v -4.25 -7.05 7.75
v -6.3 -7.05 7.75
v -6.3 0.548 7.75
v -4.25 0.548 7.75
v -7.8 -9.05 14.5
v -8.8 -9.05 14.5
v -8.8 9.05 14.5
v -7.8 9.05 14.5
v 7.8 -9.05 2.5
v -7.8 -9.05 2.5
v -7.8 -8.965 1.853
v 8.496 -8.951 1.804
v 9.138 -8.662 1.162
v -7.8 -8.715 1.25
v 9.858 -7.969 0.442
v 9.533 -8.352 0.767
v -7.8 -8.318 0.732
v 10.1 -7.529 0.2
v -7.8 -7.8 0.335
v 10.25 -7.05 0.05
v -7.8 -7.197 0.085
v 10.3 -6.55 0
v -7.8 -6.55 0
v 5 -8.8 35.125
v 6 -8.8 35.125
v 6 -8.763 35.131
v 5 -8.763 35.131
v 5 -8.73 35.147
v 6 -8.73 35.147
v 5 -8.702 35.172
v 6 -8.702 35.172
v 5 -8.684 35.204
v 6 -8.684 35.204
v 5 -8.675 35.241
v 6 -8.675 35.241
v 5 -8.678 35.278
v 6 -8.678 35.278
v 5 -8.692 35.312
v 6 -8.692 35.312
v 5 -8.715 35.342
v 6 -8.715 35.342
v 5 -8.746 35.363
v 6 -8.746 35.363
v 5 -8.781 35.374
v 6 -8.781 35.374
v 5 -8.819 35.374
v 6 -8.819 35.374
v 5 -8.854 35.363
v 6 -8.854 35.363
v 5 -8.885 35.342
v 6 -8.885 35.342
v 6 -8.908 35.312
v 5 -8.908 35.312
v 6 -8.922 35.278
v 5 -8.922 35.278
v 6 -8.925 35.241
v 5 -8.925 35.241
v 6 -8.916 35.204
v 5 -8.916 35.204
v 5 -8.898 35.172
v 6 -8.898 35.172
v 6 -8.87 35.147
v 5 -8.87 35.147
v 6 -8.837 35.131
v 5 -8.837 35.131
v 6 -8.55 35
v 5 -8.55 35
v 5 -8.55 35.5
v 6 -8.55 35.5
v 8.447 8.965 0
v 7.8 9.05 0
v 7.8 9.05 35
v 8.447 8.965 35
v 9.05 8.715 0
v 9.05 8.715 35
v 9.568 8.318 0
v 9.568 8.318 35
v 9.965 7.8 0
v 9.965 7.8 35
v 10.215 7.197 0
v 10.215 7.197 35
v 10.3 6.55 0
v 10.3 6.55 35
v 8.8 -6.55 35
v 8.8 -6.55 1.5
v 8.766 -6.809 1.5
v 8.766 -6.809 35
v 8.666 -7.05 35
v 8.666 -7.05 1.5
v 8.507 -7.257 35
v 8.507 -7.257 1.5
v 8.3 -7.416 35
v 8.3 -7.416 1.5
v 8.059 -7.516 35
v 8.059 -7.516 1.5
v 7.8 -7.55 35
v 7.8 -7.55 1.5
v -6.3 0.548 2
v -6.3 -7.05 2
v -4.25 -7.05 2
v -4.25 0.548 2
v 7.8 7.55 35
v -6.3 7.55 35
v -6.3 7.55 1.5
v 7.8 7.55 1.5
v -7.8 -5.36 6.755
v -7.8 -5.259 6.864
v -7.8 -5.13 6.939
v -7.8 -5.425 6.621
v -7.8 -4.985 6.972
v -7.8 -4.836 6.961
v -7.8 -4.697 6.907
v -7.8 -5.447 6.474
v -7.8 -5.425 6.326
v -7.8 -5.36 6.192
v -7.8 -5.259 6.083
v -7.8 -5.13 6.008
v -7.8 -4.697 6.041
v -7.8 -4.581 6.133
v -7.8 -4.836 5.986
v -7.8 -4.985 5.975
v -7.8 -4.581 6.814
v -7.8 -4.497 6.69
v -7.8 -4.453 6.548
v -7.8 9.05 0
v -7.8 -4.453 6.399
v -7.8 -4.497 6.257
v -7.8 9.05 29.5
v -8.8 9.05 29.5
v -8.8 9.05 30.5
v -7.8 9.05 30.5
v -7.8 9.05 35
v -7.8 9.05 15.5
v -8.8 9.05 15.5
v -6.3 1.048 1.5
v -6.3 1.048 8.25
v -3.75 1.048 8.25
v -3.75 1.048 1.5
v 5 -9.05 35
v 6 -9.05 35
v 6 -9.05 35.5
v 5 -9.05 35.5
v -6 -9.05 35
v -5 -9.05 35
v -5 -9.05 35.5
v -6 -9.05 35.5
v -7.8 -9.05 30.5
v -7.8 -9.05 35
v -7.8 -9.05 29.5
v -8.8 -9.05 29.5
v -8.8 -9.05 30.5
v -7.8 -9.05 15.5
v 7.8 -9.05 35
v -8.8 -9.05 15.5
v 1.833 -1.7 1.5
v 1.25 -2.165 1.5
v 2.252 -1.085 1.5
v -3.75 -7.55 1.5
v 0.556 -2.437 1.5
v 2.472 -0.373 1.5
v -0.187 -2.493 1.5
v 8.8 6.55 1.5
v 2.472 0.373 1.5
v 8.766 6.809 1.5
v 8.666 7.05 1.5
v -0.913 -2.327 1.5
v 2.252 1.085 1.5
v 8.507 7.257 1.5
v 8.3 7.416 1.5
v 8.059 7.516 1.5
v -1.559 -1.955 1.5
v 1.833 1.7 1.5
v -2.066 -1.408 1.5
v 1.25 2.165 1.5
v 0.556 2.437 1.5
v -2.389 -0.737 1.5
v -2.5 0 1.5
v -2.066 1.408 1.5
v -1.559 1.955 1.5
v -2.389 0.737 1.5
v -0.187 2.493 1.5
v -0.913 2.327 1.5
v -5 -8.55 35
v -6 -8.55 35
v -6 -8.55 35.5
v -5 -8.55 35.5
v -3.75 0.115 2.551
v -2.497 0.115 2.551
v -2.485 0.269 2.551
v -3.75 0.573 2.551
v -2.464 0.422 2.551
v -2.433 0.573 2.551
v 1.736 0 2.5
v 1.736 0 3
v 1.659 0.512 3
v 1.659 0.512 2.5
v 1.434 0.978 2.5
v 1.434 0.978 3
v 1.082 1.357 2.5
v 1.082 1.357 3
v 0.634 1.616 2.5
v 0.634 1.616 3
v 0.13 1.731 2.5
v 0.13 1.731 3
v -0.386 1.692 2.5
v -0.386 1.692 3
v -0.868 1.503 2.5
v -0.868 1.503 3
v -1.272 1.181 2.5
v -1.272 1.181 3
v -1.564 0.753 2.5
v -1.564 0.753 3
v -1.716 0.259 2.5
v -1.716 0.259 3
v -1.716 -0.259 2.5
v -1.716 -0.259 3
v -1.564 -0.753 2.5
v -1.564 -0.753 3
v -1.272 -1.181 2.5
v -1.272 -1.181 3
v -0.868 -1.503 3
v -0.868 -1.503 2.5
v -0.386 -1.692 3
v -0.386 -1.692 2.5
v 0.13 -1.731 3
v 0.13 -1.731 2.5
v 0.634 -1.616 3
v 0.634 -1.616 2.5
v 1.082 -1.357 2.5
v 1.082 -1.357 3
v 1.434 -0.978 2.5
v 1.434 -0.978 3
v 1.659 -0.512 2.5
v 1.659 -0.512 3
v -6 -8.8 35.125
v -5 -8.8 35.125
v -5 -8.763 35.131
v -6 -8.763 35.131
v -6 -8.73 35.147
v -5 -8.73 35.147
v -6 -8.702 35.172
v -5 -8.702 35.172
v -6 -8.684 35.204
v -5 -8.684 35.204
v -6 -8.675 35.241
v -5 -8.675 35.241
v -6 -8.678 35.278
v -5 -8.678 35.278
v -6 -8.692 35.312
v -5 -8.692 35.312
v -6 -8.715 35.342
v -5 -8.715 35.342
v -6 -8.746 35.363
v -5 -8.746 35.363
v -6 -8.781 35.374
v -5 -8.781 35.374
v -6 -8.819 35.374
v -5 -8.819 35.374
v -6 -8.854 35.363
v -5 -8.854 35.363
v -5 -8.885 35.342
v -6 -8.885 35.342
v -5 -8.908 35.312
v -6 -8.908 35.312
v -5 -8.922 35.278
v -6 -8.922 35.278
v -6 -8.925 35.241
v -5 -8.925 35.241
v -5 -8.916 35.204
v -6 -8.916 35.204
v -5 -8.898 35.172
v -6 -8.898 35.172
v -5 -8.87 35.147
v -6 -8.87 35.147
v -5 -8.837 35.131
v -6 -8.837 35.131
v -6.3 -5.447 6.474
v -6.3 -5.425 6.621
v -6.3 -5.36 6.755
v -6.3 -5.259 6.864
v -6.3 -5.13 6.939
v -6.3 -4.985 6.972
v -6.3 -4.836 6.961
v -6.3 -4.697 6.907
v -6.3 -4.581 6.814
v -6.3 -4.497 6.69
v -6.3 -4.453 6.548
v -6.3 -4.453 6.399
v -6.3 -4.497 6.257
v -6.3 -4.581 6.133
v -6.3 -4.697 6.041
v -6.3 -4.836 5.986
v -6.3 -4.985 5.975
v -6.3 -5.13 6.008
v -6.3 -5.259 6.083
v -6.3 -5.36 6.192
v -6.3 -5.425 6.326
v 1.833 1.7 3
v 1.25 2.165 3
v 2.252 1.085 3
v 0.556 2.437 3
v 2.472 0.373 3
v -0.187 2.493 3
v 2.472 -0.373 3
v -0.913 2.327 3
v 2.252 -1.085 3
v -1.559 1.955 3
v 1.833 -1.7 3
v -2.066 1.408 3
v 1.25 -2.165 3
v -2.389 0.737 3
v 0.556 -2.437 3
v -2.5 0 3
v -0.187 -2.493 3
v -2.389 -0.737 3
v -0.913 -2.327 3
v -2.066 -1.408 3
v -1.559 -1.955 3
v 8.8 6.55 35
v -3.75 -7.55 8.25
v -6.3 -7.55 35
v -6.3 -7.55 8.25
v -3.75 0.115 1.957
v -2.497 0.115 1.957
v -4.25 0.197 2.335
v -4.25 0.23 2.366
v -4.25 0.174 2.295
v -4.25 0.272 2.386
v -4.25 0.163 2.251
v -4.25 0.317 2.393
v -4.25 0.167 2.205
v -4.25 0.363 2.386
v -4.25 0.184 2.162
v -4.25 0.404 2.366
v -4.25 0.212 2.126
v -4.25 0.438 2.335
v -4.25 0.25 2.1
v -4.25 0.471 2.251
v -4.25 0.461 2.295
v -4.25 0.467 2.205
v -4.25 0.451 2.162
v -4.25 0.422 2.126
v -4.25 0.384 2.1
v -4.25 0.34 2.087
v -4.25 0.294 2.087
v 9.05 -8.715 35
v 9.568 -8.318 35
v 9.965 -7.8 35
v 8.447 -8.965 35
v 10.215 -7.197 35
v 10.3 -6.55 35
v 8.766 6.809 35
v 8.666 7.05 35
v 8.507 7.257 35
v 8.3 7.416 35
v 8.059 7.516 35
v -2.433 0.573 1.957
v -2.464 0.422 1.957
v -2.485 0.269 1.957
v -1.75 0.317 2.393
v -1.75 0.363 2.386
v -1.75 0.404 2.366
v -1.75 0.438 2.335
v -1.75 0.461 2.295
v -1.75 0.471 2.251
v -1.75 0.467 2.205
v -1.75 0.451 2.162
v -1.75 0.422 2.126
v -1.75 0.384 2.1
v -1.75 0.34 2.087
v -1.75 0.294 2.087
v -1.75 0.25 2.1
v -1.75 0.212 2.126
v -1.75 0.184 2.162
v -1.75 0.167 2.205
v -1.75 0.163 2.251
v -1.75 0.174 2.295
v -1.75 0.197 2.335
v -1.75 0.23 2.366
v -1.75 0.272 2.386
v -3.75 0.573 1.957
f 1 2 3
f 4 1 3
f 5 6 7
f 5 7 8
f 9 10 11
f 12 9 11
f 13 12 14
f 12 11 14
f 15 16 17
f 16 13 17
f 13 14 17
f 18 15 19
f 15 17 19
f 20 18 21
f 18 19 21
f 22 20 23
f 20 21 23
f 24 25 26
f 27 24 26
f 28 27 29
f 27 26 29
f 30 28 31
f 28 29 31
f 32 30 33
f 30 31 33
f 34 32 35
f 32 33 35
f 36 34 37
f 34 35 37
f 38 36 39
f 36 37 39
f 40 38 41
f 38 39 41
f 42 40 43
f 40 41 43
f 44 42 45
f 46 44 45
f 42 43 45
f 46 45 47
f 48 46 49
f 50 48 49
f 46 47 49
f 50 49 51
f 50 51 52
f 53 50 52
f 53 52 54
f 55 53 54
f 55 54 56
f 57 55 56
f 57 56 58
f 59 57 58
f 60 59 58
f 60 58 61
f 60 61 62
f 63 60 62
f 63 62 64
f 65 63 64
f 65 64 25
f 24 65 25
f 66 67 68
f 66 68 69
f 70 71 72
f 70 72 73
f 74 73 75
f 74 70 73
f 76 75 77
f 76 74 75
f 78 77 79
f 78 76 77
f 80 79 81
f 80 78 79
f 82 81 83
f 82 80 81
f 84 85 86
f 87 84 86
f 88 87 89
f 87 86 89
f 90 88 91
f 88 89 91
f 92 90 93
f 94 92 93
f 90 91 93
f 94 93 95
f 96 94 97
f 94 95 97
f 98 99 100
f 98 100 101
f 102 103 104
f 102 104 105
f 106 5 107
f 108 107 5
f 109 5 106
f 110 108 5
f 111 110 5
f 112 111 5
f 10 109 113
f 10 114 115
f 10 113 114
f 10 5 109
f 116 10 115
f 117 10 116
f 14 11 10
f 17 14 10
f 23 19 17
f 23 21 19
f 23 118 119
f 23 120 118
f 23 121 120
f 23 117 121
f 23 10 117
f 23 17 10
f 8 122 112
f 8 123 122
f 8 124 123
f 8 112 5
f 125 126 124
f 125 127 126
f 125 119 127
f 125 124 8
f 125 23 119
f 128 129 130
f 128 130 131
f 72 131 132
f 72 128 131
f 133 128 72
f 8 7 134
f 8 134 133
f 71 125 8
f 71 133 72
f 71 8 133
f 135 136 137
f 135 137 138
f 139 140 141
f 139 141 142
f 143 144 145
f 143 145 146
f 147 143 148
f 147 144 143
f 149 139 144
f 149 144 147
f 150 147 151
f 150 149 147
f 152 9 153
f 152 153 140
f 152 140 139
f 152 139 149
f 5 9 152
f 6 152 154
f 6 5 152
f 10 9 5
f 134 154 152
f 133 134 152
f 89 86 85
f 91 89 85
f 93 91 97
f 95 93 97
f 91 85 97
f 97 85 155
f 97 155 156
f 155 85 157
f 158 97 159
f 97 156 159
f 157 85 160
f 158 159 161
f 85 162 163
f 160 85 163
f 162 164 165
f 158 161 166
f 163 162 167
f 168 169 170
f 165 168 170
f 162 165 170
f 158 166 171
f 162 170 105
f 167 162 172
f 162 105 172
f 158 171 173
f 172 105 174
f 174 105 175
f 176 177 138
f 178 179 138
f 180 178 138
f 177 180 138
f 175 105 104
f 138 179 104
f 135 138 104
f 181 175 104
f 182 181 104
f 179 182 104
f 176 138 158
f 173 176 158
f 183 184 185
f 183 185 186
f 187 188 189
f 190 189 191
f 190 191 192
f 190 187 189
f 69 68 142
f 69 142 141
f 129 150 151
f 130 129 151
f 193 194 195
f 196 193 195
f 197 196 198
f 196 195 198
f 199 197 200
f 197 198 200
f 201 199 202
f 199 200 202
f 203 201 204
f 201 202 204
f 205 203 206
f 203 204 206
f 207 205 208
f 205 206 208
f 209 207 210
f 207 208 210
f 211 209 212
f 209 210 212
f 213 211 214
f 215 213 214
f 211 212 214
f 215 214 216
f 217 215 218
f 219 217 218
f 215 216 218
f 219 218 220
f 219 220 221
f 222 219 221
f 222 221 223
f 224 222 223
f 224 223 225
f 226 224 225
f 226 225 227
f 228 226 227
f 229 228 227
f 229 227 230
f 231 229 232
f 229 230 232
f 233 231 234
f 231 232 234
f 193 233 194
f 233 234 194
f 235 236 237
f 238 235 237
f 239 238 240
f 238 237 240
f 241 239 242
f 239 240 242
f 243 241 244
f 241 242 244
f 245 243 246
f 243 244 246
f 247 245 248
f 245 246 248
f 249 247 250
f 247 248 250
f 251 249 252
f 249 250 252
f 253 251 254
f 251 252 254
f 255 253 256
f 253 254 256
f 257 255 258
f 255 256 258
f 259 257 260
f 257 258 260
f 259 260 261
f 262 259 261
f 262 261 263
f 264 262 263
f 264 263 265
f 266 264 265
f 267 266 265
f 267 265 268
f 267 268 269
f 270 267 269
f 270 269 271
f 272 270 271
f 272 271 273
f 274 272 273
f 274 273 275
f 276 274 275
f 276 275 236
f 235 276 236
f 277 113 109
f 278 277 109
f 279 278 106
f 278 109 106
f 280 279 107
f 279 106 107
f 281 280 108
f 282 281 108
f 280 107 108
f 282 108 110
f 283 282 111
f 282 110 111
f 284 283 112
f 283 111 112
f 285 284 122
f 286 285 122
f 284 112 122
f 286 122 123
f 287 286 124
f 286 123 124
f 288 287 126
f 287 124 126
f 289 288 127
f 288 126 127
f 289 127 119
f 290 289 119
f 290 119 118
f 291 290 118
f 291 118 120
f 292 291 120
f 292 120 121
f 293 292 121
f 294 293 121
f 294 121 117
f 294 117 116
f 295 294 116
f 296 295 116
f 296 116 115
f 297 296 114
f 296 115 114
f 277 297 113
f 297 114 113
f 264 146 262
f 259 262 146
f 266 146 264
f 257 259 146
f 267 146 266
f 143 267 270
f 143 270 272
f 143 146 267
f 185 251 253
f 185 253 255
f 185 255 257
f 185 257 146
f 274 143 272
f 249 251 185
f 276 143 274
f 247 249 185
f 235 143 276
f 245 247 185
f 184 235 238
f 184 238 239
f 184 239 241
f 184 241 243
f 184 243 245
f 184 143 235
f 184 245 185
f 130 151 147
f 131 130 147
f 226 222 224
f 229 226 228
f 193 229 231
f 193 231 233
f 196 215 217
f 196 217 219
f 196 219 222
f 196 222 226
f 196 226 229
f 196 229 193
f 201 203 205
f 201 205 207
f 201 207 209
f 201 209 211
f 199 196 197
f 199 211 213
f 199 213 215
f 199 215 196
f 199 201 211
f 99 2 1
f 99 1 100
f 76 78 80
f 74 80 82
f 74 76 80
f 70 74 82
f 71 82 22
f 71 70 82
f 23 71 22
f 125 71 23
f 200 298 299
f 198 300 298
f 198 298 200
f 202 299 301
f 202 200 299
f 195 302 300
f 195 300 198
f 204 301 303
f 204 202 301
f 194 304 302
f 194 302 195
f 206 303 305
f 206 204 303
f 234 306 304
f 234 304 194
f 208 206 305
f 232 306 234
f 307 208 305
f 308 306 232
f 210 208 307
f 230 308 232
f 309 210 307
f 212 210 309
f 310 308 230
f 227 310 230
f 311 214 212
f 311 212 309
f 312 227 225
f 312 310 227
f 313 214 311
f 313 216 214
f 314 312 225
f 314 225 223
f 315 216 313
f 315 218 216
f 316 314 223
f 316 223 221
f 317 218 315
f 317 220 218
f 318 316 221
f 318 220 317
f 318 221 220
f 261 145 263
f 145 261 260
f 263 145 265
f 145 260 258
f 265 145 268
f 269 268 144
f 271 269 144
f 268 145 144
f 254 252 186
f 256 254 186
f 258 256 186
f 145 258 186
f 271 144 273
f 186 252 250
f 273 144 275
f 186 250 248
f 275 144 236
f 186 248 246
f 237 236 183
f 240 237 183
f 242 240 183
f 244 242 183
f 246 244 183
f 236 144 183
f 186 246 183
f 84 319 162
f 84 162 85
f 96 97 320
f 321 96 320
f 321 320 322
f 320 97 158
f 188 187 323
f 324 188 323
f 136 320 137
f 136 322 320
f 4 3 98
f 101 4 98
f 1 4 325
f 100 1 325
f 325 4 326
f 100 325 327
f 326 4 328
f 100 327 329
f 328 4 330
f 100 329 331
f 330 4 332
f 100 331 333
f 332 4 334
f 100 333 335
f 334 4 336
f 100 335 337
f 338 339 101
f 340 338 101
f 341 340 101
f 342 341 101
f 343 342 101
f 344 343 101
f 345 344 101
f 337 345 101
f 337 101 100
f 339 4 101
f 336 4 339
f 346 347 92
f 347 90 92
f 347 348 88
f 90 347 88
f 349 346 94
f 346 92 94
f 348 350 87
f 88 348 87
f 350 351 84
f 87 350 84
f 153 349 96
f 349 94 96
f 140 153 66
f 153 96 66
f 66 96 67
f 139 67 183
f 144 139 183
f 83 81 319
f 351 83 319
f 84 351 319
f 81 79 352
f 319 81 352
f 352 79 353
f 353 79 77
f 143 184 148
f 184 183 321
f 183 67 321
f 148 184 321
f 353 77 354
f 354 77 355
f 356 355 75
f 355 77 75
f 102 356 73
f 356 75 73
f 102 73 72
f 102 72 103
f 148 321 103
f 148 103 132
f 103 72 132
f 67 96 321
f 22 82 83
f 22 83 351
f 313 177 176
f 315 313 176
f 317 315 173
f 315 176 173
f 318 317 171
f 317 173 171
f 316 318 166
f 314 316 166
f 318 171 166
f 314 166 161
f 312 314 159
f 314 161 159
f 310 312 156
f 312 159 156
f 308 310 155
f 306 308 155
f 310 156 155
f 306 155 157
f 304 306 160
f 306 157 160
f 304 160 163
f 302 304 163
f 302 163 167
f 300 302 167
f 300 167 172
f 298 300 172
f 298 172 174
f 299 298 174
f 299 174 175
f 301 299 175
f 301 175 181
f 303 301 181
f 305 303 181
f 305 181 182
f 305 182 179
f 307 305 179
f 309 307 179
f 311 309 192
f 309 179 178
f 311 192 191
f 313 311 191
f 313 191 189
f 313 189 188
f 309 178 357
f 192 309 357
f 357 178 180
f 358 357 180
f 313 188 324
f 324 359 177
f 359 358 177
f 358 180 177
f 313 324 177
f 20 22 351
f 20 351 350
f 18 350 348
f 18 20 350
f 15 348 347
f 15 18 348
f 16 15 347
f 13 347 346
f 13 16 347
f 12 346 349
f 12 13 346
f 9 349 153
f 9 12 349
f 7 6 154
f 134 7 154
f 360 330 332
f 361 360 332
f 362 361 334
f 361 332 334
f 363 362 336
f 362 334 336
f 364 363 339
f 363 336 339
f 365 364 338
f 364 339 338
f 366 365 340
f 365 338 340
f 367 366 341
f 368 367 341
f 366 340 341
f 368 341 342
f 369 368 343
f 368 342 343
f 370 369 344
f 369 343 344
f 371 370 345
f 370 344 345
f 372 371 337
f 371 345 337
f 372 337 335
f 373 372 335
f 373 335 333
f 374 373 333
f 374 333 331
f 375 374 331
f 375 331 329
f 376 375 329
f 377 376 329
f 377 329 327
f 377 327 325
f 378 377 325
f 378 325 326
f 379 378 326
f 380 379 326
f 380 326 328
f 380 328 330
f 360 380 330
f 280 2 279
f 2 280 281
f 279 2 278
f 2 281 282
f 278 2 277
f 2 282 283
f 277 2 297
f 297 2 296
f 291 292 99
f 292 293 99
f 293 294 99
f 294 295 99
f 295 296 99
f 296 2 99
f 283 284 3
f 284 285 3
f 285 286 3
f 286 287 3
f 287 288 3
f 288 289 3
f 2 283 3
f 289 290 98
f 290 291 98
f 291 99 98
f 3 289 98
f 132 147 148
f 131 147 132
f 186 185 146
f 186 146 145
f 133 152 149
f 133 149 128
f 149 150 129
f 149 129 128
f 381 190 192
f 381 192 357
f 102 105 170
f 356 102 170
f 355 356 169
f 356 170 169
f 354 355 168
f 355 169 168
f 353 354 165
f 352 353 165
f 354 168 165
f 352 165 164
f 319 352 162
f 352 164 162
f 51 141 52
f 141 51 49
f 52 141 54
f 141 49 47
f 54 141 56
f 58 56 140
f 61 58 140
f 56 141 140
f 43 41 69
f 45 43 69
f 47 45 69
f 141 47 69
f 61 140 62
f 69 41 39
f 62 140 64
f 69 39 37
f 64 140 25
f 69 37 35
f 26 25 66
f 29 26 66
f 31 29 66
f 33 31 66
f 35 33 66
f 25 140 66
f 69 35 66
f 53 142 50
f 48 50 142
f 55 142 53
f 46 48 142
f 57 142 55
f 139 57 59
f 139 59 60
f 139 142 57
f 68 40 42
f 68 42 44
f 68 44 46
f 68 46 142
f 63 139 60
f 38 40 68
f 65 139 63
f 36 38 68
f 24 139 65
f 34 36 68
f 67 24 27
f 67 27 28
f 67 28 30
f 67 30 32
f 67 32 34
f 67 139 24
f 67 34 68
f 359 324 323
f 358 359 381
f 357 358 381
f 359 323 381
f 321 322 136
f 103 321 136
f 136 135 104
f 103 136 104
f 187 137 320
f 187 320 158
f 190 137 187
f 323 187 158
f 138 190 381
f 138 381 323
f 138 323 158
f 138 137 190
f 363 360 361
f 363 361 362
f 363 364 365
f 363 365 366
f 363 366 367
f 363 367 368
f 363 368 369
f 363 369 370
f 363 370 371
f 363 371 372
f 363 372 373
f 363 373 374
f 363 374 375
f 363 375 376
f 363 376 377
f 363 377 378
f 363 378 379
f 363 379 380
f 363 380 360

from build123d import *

# Parameters (mm, degrees)
BOSS_EXTRUDE1_DEPTH       = 35
BOSS_EXTRUDE3_DEPTH       = 1.5
SKETCH5_W                 = 1
SKETCH5_H                 = 1
BOSS_EXTRUDE4_DEPTH       = 18.1
CUT_EXTRUDE2_DEPTH        = 18.1
SKETCH9_W                 = 1
SKETCH9_H                 = 0.5
BOSS_EXTRUDE5_DEPTH       = 0.5
CUT_EXTRUDE3_REACH        = 41.512
SKETCH10_R                = 0.125
SKETCH11_R                = 2.5
BOSS_EXTRUDE6_DEPTH       = 1.5
SKETCH23_R                = 0.5
CUT_EXTRUDE12_DEPTH       = 1.5
SKETCH26_W                = 6.749879612
SKETCH26_H                = 8.598416767
SKETCH26_W_2              = 5.749879612
SKETCH26_H_2              = 7.598416767
BOSS_EXTRUDE16_DEPTH      = 2.05
BOSS_EXTRUDE23_REACH      = 41.419
BOSS_EXTRUDE23_END_RADIUS = 2.5
SKETCH27_W                = 0.594319842
SKETCH27_H                = 0.457567035
SKETCH27_R                = 0.154135996
SKETCH28_W                = 6.749879612
SKETCH28_H                = 8.598416767
BOSS_EXTRUDE24_DEPTH      = 0.5
SKETCH29_R                = 0.154135996
CUT_EXTRUDE13_DEPTH       = 2.5
SKETCH30_R                = 1.735676045
CUT_EXTRUDE14_DEPTH       = 0.5


with BuildPart() as part:
    # Sketch1 → Boss-Extrude1 (new body)
    with BuildSketch(Plane.XY):
        with BuildLine():
            Line((10.3, 6.55), (10.3, -6.55))
            ThreePointArc((10.3, -6.55), (9.567766953, -8.317766953), (7.8, -9.05))
            Line((7.8, -9.05), (-7.8, -9.05))
            Line((-7.8, -9.05), (-7.8, 9.05))
            Line((-7.8, 9.05), (7.8, 9.05))
            ThreePointArc((7.8, 9.05), (9.567766953, 8.317766953), (10.3, 6.55))
        make_face()
        with BuildLine():
            Line((-6.3, 7.55), (7.8, 7.55))
            ThreePointArc((7.8, 7.55), (8.507106781, 7.257106781), (8.8, 6.55))
            Line((8.8, 6.55), (8.8, -6.55))
            ThreePointArc((8.8, -6.55), (8.507106781, -7.257106781), (7.8, -7.55))
            Line((7.8, -7.55), (-6.3, -7.55))
            Line((-6.3, -7.55), (-6.3, 7.55))
        make_face(mode=Mode.SUBTRACT)
    extrude(amount=BOSS_EXTRUDE1_DEPTH)

    # Sketch4 → Boss-Extrude3 (add)
    with BuildSketch(Plane(origin=(0, 0, 0), x_dir=(-1, 0, 0), z_dir=(0, 0, -1))):
        with BuildLine():
            Line((7.8, -9.05), (7.8, 9.05))
            Line((7.8, 9.05), (-7.8, 9.05))
            ThreePointArc((-7.8, 9.05), (-9.567766953, 8.317766953), (-10.3, 6.55))
            Line((-10.3, 6.55), (-10.3, -6.55))
            ThreePointArc((-10.3, -6.55), (-9.567766953, -8.317766953), (-7.8, -9.05))
            Line((-7.8, -9.05), (7.8, -9.05))
        make_face()
    extrude(amount=-BOSS_EXTRUDE3_DEPTH)

    # Sketch5 → Boss-Extrude4 (add)
    with BuildSketch(Plane.XZ.offset(9.05)):
        with Locations((-8.3, 15)):
            Rectangle(SKETCH5_W, SKETCH5_H)
        with Locations((-8.3, 30)):
            Rectangle(SKETCH5_W, SKETCH5_H)
    extrude(amount=-BOSS_EXTRUDE4_DEPTH)

    # Sketch8 → Cut-Extrude2 (cut)
    with BuildSketch(Plane.ZY.offset(7.8)):
        with BuildLine():
            Line((0, -6.55), (0, -9.05))
            Line((0, -9.05), (2.5, -9.05))
            ThreePointArc((2.5, -9.05), (0.732233047, -8.317766953), (0, -6.55))
        make_face()
    extrude(amount=-CUT_EXTRUDE2_DEPTH, mode=Mode.SUBTRACT)

    # Sketch9 → Boss-Extrude5 (add)
    with BuildSketch(Plane.XY.offset(35)):
        with Locations((-5.5, -8.8)):
            Rectangle(SKETCH9_W, SKETCH9_H)
        with Locations((5.5, -8.8)):
            Rectangle(SKETCH9_W, SKETCH9_H)
    extrude(amount=BOSS_EXTRUDE5_DEPTH)

    # Cut-Extrude3: up to this face of the body (flat: up to its plane)
    cut_extrude3_end = Plane(part.part.faces().sort_by_distance((-6, -8.8, 35.25))[0])
    # Sketch10 → Cut-Extrude3 (cut, up to the picked face)
    with BuildSketch(Plane(origin=(6, 0, 0), x_dir=(0, 0, -1), z_dir=(1, 0, 0)), mode=Mode.PRIVATE) as cut_extrude3_sk1:
        with Locations((-35.25, -8.8)):
            Circle(SKETCH10_R)
    cut_extrude3_tool1 = split(extrude(cut_extrude3_sk1.sketch, amount=-CUT_EXTRUDE3_REACH, mode=Mode.PRIVATE), bisect_by=cut_extrude3_end, keep=Keep.BOTH, mode=Mode.PRIVATE)
    add(cut_extrude3_tool1.solids().sort_by(Axis((6, -8.8, 35.25), (-1, 0, 0)))[0], mode=Mode.SUBTRACT)

    # Sketch11 → Boss-Extrude6 (add)
    with BuildSketch(Plane.XY.offset(1.5)):
        with Locations(Location((0, 0, 0), (0, 0, 180))):
            Circle(SKETCH11_R)
    extrude(amount=BOSS_EXTRUDE6_DEPTH)

    # Sketch23 → Cut-Extrude12 (cut)
    with BuildSketch(Plane.ZY.offset(7.8)):
        with Locations(Location((6.47352849, -4.947355043, 0), (0, 0, 270))):
            Circle(SKETCH23_R)
    extrude(amount=-CUT_EXTRUDE12_DEPTH, mode=Mode.SUBTRACT)

    # Sketch26 → Boss-Extrude16 (add)
    with BuildSketch(Plane(origin=(-6.3, 0, 0), x_dir=(0, 0, -1), z_dir=(1, 0, 0))):
        with Locations((-4.874939806, -3.250791617)):
            Rectangle(SKETCH26_W, SKETCH26_H)
        with Locations((-4.874939806, -3.250791617)):
            Rectangle(SKETCH26_W_2, SKETCH26_H_2, mode=Mode.SUBTRACT)
    extrude(amount=BOSS_EXTRUDE16_DEPTH)

    # Boss-Extrude23: up to this cylinder (the profile starts outside it)
    boss_extrude23_end = Plane(origin=(0, 0, 2.254205), z_dir=(0, 0, -1)) * Cylinder(BOSS_EXTRUDE23_END_RADIUS, 88.838, mode=Mode.PRIVATE)
    # Sketch27 → Boss-Extrude23 (add, up to the surface)
    with BuildSketch(Plane(origin=(-4.25, 0, 0), x_dir=(0, 0, -1), z_dir=(1, 0, 0)), mode=Mode.PRIVATE) as boss_extrude23_sk1:
        with Locations((-2.25420487, 0.344193495)):
            Rectangle(SKETCH27_W, SKETCH27_H)
        with Locations(Location((-2.239067338, 0.317165037, 0), (0, 0, 270))):
            Circle(SKETCH27_R, mode=Mode.SUBTRACT)
    boss_extrude23_tool1 = extrude(boss_extrude23_sk1.sketch, amount=BOSS_EXTRUDE23_REACH, mode=Mode.PRIVATE) - boss_extrude23_end
    add(boss_extrude23_tool1.solids().sort_by_distance((-4.25, 0.565476, 2.254205))[0])

    # Sketch28 → Boss-Extrude24 (add)
    with BuildSketch(Plane(origin=(-4.25, 0, 0), x_dir=(0, 0, -1), z_dir=(1, 0, 0))):
        with Locations((-4.874939806, -3.250791617)):
            Rectangle(SKETCH28_W, SKETCH28_H)
    extrude(amount=BOSS_EXTRUDE24_DEPTH)

    # Sketch29 → Cut-Extrude13 (cut)
    with BuildSketch(Plane.ZY.offset(4.25)):
        with Locations((2.239067338, 0.317165037)):
            Circle(SKETCH29_R)
    extrude(amount=-CUT_EXTRUDE13_DEPTH, mode=Mode.SUBTRACT)

    # Sketch30 → Cut-Extrude14 (cut)
    with BuildSketch(Plane.XY.offset(3)):
        Circle(SKETCH30_R)
    extrude(amount=-CUT_EXTRUDE14_DEPTH, mode=Mode.SUBTRACT)


solid = part.part
